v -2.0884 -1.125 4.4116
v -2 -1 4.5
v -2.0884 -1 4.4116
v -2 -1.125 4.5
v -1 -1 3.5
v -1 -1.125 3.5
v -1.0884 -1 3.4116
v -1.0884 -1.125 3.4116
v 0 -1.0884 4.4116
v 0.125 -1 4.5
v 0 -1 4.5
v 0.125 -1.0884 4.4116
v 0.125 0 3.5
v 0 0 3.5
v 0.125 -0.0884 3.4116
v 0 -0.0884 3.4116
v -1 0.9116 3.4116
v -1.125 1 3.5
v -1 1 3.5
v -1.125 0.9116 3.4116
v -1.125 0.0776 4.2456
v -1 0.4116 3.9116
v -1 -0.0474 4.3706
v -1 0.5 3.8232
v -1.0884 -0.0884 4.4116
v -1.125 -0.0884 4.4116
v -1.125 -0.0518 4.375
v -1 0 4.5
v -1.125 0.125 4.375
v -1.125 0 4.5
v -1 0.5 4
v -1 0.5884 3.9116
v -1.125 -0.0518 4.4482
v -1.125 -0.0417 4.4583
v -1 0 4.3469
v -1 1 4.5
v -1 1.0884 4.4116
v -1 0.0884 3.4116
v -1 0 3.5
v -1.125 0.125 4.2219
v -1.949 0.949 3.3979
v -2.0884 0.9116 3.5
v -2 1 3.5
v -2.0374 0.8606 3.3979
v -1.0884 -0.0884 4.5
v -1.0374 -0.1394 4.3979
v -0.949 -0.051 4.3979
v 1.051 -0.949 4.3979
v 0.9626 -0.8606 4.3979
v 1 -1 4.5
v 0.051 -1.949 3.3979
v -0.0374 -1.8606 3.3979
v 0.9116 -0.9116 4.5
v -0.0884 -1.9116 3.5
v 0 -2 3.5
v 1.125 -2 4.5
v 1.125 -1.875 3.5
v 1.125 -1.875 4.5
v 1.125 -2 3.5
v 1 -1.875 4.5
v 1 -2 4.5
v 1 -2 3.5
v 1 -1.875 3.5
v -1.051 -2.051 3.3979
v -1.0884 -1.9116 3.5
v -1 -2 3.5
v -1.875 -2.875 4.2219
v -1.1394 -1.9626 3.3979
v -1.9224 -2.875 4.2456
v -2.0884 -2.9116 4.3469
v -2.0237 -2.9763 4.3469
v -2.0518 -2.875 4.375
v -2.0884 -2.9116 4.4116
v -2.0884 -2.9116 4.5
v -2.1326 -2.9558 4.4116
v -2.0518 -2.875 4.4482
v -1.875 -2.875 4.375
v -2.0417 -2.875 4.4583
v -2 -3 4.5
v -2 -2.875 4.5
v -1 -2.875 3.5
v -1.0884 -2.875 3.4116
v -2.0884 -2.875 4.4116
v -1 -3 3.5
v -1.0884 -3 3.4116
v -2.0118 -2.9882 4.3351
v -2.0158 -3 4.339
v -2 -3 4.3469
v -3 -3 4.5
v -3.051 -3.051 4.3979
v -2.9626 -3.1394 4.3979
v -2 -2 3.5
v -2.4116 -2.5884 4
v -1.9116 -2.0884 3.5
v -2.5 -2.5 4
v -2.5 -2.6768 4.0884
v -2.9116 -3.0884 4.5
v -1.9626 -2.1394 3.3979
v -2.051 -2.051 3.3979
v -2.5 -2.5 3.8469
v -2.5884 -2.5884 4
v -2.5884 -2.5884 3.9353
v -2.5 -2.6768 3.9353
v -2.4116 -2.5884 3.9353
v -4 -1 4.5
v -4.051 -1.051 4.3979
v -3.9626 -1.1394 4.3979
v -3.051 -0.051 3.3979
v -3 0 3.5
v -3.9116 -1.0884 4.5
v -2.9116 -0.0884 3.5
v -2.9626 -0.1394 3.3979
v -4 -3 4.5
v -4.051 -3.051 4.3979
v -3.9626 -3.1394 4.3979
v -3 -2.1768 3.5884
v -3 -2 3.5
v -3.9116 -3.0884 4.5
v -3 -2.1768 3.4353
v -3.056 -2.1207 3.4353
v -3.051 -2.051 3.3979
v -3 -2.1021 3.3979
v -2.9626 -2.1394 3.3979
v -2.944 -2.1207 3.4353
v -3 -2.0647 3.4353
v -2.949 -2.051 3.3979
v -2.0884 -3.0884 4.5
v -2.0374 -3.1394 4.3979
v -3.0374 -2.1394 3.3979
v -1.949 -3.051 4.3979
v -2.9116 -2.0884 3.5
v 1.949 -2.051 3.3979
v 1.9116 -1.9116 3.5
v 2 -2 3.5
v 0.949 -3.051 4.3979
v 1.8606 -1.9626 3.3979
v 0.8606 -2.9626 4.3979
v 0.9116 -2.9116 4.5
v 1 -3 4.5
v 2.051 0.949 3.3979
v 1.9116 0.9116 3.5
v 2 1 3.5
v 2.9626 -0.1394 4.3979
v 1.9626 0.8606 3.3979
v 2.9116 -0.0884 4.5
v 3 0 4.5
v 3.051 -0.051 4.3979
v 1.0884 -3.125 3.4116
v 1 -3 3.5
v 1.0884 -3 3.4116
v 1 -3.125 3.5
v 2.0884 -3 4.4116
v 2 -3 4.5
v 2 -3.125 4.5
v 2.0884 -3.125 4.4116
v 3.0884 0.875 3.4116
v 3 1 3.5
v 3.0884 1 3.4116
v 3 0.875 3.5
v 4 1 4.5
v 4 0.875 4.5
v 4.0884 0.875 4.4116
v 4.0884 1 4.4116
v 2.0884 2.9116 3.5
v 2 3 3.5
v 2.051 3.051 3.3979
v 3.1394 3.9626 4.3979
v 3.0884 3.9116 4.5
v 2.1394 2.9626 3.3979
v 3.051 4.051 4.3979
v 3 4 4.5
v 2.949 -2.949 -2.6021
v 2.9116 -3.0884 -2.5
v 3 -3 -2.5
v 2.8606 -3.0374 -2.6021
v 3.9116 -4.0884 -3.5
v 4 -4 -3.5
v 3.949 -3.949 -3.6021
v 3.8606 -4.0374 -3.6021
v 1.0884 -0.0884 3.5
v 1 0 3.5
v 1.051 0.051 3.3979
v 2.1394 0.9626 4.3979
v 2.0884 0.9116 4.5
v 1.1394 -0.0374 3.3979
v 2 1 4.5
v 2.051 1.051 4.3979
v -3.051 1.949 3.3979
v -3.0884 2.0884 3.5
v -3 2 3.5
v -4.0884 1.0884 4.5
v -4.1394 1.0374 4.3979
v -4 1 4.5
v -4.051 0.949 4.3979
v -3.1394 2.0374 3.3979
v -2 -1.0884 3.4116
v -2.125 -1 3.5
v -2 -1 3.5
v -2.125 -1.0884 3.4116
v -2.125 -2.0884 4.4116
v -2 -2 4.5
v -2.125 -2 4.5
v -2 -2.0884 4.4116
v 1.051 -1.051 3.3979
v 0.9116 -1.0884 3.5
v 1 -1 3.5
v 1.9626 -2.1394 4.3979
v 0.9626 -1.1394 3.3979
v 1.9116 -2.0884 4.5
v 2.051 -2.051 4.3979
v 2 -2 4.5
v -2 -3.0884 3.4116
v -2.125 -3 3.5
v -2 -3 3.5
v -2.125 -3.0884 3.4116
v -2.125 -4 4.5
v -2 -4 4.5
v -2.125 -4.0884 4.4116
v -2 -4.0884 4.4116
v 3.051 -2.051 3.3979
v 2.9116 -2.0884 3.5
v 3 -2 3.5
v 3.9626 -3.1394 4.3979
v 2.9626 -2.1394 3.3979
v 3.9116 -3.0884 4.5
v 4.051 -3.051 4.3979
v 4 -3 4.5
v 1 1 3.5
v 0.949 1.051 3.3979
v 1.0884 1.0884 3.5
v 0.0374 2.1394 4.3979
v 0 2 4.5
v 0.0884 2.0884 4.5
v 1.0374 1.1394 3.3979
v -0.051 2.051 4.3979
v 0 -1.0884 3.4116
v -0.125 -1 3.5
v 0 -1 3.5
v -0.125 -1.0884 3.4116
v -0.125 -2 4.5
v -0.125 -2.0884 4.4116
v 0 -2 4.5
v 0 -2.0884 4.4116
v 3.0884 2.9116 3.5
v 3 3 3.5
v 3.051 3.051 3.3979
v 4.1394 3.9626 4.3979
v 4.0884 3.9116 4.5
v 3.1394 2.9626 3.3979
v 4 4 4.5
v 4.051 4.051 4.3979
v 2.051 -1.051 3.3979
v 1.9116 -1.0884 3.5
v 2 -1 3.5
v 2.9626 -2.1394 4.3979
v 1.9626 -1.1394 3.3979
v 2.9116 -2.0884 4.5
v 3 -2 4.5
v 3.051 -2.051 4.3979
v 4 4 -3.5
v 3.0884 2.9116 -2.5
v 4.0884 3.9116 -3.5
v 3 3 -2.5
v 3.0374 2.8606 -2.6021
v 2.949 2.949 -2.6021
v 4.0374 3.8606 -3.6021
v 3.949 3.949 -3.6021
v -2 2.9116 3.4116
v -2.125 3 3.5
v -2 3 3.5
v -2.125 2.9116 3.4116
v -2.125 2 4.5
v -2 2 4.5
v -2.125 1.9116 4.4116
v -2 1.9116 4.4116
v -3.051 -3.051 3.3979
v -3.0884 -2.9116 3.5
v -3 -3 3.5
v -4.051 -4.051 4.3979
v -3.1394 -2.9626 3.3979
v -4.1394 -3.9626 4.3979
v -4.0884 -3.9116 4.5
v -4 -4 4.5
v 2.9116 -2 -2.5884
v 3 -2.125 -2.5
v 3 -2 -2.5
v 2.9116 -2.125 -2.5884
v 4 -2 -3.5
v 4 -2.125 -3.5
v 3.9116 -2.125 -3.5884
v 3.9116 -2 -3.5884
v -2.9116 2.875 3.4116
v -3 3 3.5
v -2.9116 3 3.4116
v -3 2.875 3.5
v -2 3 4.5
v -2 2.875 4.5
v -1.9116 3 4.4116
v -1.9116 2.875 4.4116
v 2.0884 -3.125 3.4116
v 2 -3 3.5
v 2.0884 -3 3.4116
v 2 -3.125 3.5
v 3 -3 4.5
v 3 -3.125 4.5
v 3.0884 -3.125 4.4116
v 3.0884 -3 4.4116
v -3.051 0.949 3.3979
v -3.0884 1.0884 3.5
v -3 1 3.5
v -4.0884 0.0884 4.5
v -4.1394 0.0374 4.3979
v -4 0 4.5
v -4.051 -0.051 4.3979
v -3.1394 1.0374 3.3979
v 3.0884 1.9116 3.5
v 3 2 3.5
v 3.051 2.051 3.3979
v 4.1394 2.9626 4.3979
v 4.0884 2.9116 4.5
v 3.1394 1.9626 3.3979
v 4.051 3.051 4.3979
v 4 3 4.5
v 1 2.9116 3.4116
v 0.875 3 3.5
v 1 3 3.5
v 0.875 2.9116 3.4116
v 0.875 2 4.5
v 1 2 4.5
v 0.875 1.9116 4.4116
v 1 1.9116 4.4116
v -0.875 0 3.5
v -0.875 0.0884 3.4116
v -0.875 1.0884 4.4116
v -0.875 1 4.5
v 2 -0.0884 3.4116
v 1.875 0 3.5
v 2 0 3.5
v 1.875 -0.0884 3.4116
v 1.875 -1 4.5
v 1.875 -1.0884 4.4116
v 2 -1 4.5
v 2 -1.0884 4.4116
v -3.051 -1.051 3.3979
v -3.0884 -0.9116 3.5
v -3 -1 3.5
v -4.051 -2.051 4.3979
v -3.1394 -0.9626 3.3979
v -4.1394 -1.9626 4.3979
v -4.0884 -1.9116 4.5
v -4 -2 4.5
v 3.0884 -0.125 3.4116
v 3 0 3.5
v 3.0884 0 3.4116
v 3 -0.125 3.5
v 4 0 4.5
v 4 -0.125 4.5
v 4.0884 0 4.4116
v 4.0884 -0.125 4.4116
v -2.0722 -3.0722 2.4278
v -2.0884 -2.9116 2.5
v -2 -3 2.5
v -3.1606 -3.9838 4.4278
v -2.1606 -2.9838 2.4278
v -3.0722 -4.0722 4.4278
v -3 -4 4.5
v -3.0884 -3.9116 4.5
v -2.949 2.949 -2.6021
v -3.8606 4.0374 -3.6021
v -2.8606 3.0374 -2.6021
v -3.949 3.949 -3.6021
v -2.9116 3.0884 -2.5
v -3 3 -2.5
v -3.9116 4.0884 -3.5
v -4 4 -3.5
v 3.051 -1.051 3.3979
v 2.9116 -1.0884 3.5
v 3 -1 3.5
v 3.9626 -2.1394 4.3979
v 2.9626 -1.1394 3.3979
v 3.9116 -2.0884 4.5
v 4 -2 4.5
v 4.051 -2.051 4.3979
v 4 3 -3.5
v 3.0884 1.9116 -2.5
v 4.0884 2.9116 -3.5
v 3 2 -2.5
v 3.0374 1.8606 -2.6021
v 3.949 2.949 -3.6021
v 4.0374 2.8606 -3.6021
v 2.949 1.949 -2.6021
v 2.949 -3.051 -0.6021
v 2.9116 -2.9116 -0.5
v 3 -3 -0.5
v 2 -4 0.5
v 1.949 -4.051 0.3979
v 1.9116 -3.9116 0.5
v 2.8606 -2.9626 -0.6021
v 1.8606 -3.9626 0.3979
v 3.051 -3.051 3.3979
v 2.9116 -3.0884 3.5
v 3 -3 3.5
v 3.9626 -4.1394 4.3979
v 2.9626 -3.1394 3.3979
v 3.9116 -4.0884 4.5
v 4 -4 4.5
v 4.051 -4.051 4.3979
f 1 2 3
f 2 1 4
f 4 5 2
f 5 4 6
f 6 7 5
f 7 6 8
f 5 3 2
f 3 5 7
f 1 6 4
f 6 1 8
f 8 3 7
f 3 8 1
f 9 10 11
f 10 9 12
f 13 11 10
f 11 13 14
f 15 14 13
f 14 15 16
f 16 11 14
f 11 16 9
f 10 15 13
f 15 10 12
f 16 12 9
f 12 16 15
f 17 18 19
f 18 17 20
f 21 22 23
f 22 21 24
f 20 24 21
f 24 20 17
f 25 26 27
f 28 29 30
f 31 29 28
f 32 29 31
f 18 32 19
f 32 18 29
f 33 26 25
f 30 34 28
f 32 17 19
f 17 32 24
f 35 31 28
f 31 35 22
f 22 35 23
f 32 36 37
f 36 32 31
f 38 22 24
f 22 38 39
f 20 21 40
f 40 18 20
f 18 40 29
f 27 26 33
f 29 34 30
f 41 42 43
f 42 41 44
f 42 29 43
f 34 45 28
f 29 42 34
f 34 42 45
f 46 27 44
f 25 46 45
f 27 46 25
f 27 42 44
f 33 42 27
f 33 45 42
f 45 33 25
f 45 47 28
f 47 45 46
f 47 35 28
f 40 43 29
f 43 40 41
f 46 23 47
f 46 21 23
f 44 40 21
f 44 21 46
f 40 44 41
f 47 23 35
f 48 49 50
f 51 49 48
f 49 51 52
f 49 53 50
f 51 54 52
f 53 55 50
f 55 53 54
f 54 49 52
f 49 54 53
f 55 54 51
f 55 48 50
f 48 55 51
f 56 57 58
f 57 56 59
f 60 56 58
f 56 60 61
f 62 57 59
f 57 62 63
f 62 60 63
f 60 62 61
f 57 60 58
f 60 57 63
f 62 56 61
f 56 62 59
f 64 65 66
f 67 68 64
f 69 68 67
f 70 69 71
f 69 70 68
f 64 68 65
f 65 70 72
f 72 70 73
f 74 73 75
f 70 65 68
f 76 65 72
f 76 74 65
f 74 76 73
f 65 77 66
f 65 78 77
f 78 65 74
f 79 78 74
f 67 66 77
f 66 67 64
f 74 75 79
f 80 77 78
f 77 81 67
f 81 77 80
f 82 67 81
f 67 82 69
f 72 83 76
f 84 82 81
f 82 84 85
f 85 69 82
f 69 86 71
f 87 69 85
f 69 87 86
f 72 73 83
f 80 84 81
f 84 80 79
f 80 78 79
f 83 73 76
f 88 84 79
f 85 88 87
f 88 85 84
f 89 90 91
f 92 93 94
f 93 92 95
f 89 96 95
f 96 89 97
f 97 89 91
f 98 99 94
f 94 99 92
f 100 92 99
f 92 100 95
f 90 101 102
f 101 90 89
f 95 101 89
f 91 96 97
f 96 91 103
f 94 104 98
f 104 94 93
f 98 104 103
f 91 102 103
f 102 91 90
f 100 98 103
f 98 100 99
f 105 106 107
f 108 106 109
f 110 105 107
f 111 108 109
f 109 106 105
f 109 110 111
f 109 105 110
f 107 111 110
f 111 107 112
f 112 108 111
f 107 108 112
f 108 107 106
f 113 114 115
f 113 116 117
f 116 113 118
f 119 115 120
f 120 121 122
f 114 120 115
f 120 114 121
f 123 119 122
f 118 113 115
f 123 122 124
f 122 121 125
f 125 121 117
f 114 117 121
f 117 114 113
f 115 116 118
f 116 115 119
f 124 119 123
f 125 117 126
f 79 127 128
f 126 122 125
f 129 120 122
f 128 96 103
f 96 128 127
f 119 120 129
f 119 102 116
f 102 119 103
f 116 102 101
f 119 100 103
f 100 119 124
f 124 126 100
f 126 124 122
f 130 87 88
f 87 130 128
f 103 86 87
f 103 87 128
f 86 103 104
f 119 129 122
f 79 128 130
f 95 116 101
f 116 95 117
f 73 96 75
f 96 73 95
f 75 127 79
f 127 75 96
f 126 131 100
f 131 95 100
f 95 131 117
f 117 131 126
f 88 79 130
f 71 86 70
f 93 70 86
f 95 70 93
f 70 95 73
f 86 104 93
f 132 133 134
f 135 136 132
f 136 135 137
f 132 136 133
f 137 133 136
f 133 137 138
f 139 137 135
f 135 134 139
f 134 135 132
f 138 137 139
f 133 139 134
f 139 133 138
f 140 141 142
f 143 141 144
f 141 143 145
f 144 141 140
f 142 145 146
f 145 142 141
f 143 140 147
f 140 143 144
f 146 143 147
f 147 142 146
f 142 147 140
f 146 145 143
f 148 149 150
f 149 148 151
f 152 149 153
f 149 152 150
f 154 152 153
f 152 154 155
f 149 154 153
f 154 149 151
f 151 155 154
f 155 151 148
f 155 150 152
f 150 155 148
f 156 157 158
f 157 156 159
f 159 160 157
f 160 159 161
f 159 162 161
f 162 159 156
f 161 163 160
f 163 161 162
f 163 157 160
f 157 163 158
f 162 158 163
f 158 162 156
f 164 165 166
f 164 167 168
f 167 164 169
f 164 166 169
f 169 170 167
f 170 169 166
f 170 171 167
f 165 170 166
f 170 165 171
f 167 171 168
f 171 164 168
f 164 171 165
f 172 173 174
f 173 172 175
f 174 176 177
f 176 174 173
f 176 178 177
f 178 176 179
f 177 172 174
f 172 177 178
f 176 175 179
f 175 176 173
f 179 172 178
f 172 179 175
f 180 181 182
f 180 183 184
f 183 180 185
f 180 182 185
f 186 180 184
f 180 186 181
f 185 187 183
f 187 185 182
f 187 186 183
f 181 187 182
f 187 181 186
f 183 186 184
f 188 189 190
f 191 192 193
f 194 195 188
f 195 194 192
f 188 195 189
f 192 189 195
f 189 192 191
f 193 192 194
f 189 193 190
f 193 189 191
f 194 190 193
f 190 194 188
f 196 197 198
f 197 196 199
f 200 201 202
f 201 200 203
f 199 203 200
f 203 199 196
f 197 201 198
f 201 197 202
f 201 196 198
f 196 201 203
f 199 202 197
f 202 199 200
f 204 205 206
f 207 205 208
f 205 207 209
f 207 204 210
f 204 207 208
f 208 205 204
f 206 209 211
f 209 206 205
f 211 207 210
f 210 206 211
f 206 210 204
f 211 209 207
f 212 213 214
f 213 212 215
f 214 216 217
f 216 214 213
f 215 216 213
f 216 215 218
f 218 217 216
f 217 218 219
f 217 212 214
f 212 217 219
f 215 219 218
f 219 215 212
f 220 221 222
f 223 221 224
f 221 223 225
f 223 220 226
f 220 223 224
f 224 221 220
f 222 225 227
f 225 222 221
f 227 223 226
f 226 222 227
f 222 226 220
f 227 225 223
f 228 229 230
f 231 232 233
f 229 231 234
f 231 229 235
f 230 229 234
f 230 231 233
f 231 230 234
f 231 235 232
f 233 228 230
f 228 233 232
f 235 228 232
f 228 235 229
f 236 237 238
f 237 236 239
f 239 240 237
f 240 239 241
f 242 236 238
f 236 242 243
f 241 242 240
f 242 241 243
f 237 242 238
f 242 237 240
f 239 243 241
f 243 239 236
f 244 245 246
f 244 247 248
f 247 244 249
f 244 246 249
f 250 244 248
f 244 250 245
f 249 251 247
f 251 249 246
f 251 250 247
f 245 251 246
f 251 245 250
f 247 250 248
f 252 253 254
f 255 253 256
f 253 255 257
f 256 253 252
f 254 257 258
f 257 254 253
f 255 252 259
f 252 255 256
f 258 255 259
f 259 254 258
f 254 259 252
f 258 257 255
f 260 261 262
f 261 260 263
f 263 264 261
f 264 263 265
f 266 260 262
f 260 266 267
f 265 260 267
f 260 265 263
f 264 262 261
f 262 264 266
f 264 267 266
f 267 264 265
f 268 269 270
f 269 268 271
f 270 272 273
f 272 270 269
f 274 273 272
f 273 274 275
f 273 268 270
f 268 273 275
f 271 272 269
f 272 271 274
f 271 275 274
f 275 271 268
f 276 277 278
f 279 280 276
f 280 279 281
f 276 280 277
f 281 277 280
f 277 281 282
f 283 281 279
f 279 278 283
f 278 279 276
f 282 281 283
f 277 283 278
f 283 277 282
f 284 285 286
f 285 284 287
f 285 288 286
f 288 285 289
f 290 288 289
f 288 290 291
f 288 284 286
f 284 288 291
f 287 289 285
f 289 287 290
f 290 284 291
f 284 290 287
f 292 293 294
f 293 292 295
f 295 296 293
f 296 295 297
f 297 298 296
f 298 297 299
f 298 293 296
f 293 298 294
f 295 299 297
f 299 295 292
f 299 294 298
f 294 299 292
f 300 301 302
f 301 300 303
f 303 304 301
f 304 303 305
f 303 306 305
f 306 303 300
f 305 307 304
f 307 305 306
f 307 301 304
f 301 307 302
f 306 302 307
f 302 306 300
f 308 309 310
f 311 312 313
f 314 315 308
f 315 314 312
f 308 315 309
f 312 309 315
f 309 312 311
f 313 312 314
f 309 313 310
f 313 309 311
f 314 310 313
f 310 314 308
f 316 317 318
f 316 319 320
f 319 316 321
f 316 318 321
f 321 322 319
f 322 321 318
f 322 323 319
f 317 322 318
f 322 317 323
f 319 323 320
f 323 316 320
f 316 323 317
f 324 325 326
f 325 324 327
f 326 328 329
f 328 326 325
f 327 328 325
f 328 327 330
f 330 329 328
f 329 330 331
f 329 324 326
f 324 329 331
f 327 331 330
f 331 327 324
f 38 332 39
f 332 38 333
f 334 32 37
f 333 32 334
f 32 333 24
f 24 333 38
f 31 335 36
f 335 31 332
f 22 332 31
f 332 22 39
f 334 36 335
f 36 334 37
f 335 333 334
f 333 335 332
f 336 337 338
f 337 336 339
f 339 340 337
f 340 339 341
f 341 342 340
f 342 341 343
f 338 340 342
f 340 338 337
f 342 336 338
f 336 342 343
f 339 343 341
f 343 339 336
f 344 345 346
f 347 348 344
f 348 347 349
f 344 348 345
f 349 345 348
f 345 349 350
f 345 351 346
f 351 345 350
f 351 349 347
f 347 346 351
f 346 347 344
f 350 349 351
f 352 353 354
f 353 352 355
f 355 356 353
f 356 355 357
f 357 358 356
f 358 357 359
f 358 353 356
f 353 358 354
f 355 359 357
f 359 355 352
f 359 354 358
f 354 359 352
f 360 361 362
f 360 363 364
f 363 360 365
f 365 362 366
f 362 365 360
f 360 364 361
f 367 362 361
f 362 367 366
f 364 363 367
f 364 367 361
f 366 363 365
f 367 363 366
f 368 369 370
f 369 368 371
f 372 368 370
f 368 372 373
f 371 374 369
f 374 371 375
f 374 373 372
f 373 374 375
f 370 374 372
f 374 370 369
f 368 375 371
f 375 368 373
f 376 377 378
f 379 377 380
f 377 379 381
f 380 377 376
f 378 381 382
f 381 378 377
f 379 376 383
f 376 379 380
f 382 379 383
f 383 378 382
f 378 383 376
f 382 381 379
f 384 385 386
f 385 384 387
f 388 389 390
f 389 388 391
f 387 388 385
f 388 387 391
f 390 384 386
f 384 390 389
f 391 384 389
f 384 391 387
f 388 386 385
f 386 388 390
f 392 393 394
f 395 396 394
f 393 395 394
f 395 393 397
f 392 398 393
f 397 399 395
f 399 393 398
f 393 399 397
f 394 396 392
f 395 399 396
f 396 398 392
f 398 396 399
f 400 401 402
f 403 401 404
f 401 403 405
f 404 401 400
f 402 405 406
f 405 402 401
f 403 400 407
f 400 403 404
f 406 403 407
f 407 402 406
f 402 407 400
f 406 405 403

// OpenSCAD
translate(v = [-0.5, -0.5, 0]) {
	/*Shell 0*/
	union() {
		%/*Nodes shell 0*/
		union();
		/*Edges shell 0*/
		union();
	}
	/*Shell 1*/
	union() {
		%/*Nodes shell 1*/
		union();
		/*Edges shell 1*/
		union();
	}
	/*Shell 2*/
	union() {
		%/*Nodes shell 2*/
		union() {
			/*Node $_45*/
			color(alpha = 0.1, c = "yellow") {
				translate(v = [-1, -1, 3]) {
					cube(size = [1, 1, 1]);
				}
			}
			/*Node $_23*/
			color(alpha = 0.1, c = "orange") {
				translate(v = [0, 0, 3]) {
					cube(size = [1, 1, 1]);
				}
			}
			/*Node $_94*/
			color(alpha = 0.1, c = "yellow") {
				translate(v = [-1, 1, 3]) {
					cube(size = [1, 1, 1]);
				}
			}
			/*Node $_95*/
			color(alpha = 0.1, c = "orange") {
				translate(v = [-2, 1, 3]) {
					cube(size = [1, 1, 1]);
				}
			}
			/*Node $_49*/
			color(alpha = 0.1, c = "yellow") {
				translate(v = [0, -2, 3]) {
					cube(size = [1, 1, 1]);
				}
			}
			/*Node $_27*/
			color(alpha = 0.1, c = "orange") {
				translate(v = [1, -2, 3]) {
					cube(size = [1, 1, 1]);
				}
			}
			/*Node $_100*/
			color(alpha = 0.1, c = "yellow") {
				translate(v = [-1, -2, 3]) {
					cube(size = [1, 1, 1]);
				}
			}
			/*Node $_101*/
			color(alpha = 0.1, c = "orange") {
				translate(v = [-1, -3, 3]) {
					cube(size = [1, 1, 1]);
				}
			}
			/*Node $_52*/
			color(alpha = 0.1, c = "yellow") {
				translate(v = [-2, -2, 3]) {
					cube(size = [1, 1, 1]);
				}
			}
			/*Node $_30*/
			color(alpha = 0.1, c = "orange") {
				translate(v = [-3, 0, 3]) {
					cube(size = [1, 1, 1]);
				}
			}
			/*Node $_110*/
			color(alpha = 0.1, c = "pink") {
				translate(v = [-3, -2, 3]) {
					cube(size = [1, 1, 1]);
				}
			}
			/*Node $_18__2*/
			color(alpha = 0.1, c = "lightblue") {
				translate(v = [2, -2, 3]) {
					cube(size = [1, 1, 1]);
				}
			}
			/*Node $_28__2*/
			color(alpha = 0.1, c = "lightblue") {
				translate(v = [2, 1, 3]) {
					cube(size = [1, 1, 1]);
				}
			}
			/*Node $_19__2*/
			color(alpha = 0.1, c = "lightblue") {
				translate(v = [1, -3, 3]) {
					cube(size = [1, 1, 1]);
				}
			}
			/*Node $_33__2*/
			color(alpha = 0.1, c = "lightblue") {
				translate(v = [3, 1, 3]) {
					cube(size = [1, 1, 1]);
				}
			}
			/*Node $_12__2*/
			color(alpha = 0.1, c = "lightblue") {
				translate(v = [2, 3, 3]) {
					cube(size = [1, 1, 1]);
				}
			}
			/*Node $_39__2*/
			color(alpha = 0.1, c = "lightblue") {
				translate(v = [3, -3, -3]) {
					cube(size = [1, 1, 1]);
				}
			}
			/*Node $_15__2*/
			color(alpha = 0.1, c = "lightblue") {
				translate(v = [1, 0, 3]) {
					cube(size = [1, 1, 1]);
				}
			}
			/*Node $_40__2*/
			color(alpha = 0.1, c = "lightblue") {
				translate(v = [-3, 2, 3]) {
					cube(size = [1, 1, 1]);
				}
			}
			/*Node $_36__2*/
			color(alpha = 0.1, c = "lightblue") {
				translate(v = [-2, -1, 3]) {
					cube(size = [1, 1, 1]);
				}
			}
			/*Node $_47__2*/
			color(alpha = 0.1, c = "lightblue") {
				translate(v = [1, -1, 3]) {
					cube(size = [1, 1, 1]);
				}
			}
			/*Node $_35__2*/
			color(alpha = 0.1, c = "lightblue") {
				translate(v = [-2, -3, 3]) {
					cube(size = [1, 1, 1]);
				}
			}
			/*Node $_20__2*/
			color(alpha = 0.1, c = "lightblue") {
				translate(v = [3, -2, 3]) {
					cube(size = [1, 1, 1]);
				}
			}
			/*Node $_34__2*/
			color(alpha = 0.1, c = "lightblue") {
				translate(v = [1, 1, 3]) {
					cube(size = [1, 1, 1]);
				}
			}
			/*Node $_108__2*/
			color(alpha = 0.1, c = "lightblue") {
				translate(v = [0, -1, 3]) {
					cube(size = [1, 1, 1]);
				}
			}
			/*Node $_44__2*/
			color(alpha = 0.1, c = "lightblue") {
				translate(v = [3, 3, 3]) {
					cube(size = [1, 1, 1]);
				}
			}
			/*Node $_50__2*/
			color(alpha = 0.1, c = "lightblue") {
				translate(v = [2, -1, 3]) {
					cube(size = [1, 1, 1]);
				}
			}
			/*Node $_11__2*/
			color(alpha = 0.1, c = "lightblue") {
				translate(v = [3, 3, -3]) {
					cube(size = [1, 1, 1]);
				}
			}
			/*Node $_14__2*/
			color(alpha = 0.1, c = "lightblue") {
				translate(v = [-2, 3, 3]) {
					cube(size = [1, 1, 1]);
				}
			}
			/*Node $_41__2*/
			color(alpha = 0.1, c = "lightblue") {
				translate(v = [-3, -3, 3]) {
					cube(size = [1, 1, 1]);
				}
			}
			/*Node $_42__2*/
			color(alpha = 0.1, c = "lightblue") {
				translate(v = [3, -2, -3]) {
					cube(size = [1, 1, 1]);
				}
			}
			/*Node $_10__2*/
			color(alpha = 0.1, c = "lightblue") {
				translate(v = [-3, 3, 3]) {
					cube(size = [1, 1, 1]);
				}
			}
			/*Node $_17__2*/
			color(alpha = 0.1, c = "lightblue") {
				translate(v = [2, -3, 3]) {
					cube(size = [1, 1, 1]);
				}
			}
			/*Node $_24__2*/
			color(alpha = 0.1, c = "lightblue") {
				translate(v = [-3, 1, 3]) {
					cube(size = [1, 1, 1]);
				}
			}
			/*Node $_21__2*/
			color(alpha = 0.1, c = "lightblue") {
				translate(v = [3, 2, 3]) {
					cube(size = [1, 1, 1]);
				}
			}
			/*Node $_38__2*/
			color(alpha = 0.1, c = "lightblue") {
				translate(v = [1, 3, 3]) {
					cube(size = [1, 1, 1]);
				}
			}
			/*Node $_37__2*/
			color(alpha = 0.1, c = "lightblue") {
				translate(v = [-1, 0, 3]) {
					cube(size = [1, 1, 1]);
				}
			}
			/*Node $_25__2*/
			color(alpha = 0.1, c = "lightblue") {
				translate(v = [2, 0, 3]) {
					cube(size = [1, 1, 1]);
				}
			}
			/*Node $_46__2*/
			color(alpha = 0.1, c = "lightblue") {
				translate(v = [-3, -1, 3]) {
					cube(size = [1, 1, 1]);
				}
			}
			/*Node $_43__2*/
			color(alpha = 0.1, c = "lightblue") {
				translate(v = [3, 0, 3]) {
					cube(size = [1, 1, 1]);
				}
			}
			/*Node $_32__2*/
			color(alpha = 0.1, c = "lightblue") {
				translate(v = [-2, -3, 2]) {
					cube(size = [1, 1, 1]);
				}
			}
			/*Node $_9__2*/
			color(alpha = 0.1, c = "lightblue") {
				translate(v = [-3, 3, -3]) {
					cube(size = [1, 1, 1]);
				}
			}
			/*Node $_22__2*/
			color(alpha = 0.1, c = "lightblue") {
				translate(v = [3, -1, 3]) {
					cube(size = [1, 1, 1]);
				}
			}
			/*Node $_31__2*/
			color(alpha = 0.1, c = "lightblue") {
				translate(v = [3, 2, -3]) {
					cube(size = [1, 1, 1]);
				}
			}
			/*Node $_16__2*/
			color(alpha = 0.1, c = "lightblue") {
				translate(v = [3, -3, -1]) {
					cube(size = [1, 1, 1]);
				}
			}
			/*Node $_13__2*/
			color(alpha = 0.1, c = "lightblue") {
				translate(v = [3, -3, 3]) {
					cube(size = [1, 1, 1]);
				}
			}
		}
		/*Edges shell 2*/
		union() {
			/*Edge 45 from one.ctrl_s[1].flush to $_45*/
			translate(v = [-0.5, -0.5, 3.5]) {
				rotate(a = [0, 45.00000000000001, 180.0]) {
					cube(size = [0.125, 0.125, 1.4142135623730951]);
				}
			}
			/*Edge 23 from one.ctrl_s[1].hole to $_23*/
			translate(v = [0.5, 0.5, 3.5]) {
				rotate(a = [0, 45.00000000000001, -90.0]) {
					cube(size = [0.125, 0.125, 1.4142135623730951]);
				}
			}
			/*Edge 94 from $_94 to one.thingy.devices[0].thingy.vp0*/
			translate(v = [-0.5, 0.5, 4.5]) {
				rotate(a = [0, 135.0, 90.0]) {
					cube(size = [0.125, 0.125, 1.4142135623730951]);
				}
			}
			/*Edge 95 from $_95 to one.thingy.devices[0].thingy.vp0*/
			translate(v = [-0.5, 0.5, 4.5]) {
				rotate(a = [0, 125.26438968275465, 135.0]) {
					cube(size = [0.125, 0.125, 1.7320508075688772]);
				}
			}
			/*Edge 49 from one.pump_a[1].flush to $_49*/
			translate(v = [0.5, -1.5, 3.5]) {
				rotate(a = [0, 54.735610317245346, 45.0]) {
					cube(size = [0.125, 0.125, 1.7320508075688772]);
				}
			}
			/*Edge 27 from one.pump_a[1].hole to $_27*/
			translate(v = [1.5, -1.5, 3.5]) {
				rotate(a = [0, 0.0, 0.0]) {
					cube(size = [0.125, 0.125, 1.0]);
				}
			}
			/*Edge 100 from $_100 to one.thingy.devices[0].thingy.vp3*/
			translate(v = [-1.5, -2.5, 4.5]) {
				rotate(a = [0, 125.26438968275465, 45.0]) {
					cube(size = [0.125, 0.125, 1.7320508075688772]);
				}
			}
			/*Edge 101 from $_101 to one.thingy.devices[0].thingy.vp3*/
			translate(v = [-1.5, -2.5, 4.5]) {
				rotate(a = [0, 135.0, 0.0]) {
					cube(size = [0.125, 0.125, 1.4142135623730951]);
				}
			}
			/*Edge 52 from one.pump_b[1].flush to $_52*/
			translate(v = [-1.5, -1.5, 3.5]) {
				rotate(a = [0, 54.735610317245346, -135.0]) {
					cube(size = [0.125, 0.125, 1.7320508075688772]);
				}
			}
			/*Edge 30 from one.pump_b[1].hole to $_30*/
			translate(v = [-2.5, 0.5, 3.5]) {
				rotate(a = [0, 54.735610317245346, -135.0]) {
					cube(size = [0.125, 0.125, 1.7320508075688772]);
				}
			}
			/*Edge 110 from one.thingy.devices[0].thingy.column_upper to $_110*/
			translate(v = [-2.5, -1.5, 3.5]) {
				rotate(a = [0, 54.735610317245346, -135.0]) {
					cube(size = [0.125, 0.125, 1.7320508075688772]);
				}
			}
			/*Edge 110 from $_110 to one.thingy.devices[0].thingy.vp3*/
			translate(v = [-1.5, -2.5, 4.5]) {
				rotate(a = [0, 125.26438968275465, 135.0]) {
					cube(size = [0.125, 0.125, 1.7320508075688772]);
				}
			}
			/*Edge -1 from $_18__2 to $_18__3*/
			translate(v = [1.5, -2.5, 4.5]) {
				rotate(a = [0, 125.26438968275465, 45.0]) {
					cube(size = [0.125, 0.125, 1.7320508075688772]);
				}
			}
			/*Edge -1 from $_28__2 to $_28__3*/
			translate(v = [3.5, 0.5, 4.5]) {
				rotate(a = [0, 125.26438968275465, 135.0]) {
					cube(size = [0.125, 0.125, 1.7320508075688772]);
				}
			}
			/*Edge -1 from $_19__2 to $_19__3*/
			translate(v = [2.5, -2.5, 4.5]) {
				rotate(a = [0, 135.0, 180.0]) {
					cube(size = [0.125, 0.125, 1.4142135623730951]);
				}
			}
			/*Edge -1 from $_33__2 to $_33__3*/
			translate(v = [4.5, 1.5, 4.5]) {
				rotate(a = [0, 135.0, 180.0]) {
					cube(size = [0.125, 0.125, 1.4142135623730951]);
				}
			}
			/*Edge -1 from $_12__2 to $_12__3*/
			translate(v = [3.5, 4.5, 4.5]) {
				rotate(a = [0, 125.26438968275465, -135.0]) {
					cube(size = [0.125, 0.125, 1.7320508075688772]);
				}
			}
			/*Edge -1 from $_39__2 to $_39__3*/
			translate(v = [4.5, -3.5, -3.5]) {
				rotate(a = [0, 54.735610317245346, 135.0]) {
					cube(size = [0.125, 0.125, 1.7320508075688772]);
				}
			}
			/*Edge -1 from $_15__2 to $_15__3*/
			translate(v = [2.5, 1.5, 4.5]) {
				rotate(a = [0, 125.26438968275465, -135.0]) {
					cube(size = [0.125, 0.125, 1.7320508075688772]);
				}
			}
			/*Edge -1 from $_40__2 to $_40__3*/
			translate(v = [-3.5, 1.5, 4.5]) {
				rotate(a = [0, 125.26438968275465, 45.0]) {
					cube(size = [0.125, 0.125, 1.7320508075688772]);
				}
			}
			/*Edge -1 from $_36__2 to $_36__3*/
			translate(v = [-1.5, -1.5, 4.5]) {
				rotate(a = [0, 135.0, 90.0]) {
					cube(size = [0.125, 0.125, 1.4142135623730951]);
				}
			}
			/*Edge -1 from $_47__2 to $_47__3*/
			translate(v = [2.5, -1.5, 4.5]) {
				rotate(a = [0, 125.26438968275465, 135.0]) {
					cube(size = [0.125, 0.125, 1.7320508075688772]);
				}
			}
			/*Edge -1 from $_35__2 to $_35__3*/
			translate(v = [-1.5, -3.5, 4.5]) {
				rotate(a = [0, 135.0, 90.0]) {
					cube(size = [0.125, 0.125, 1.4142135623730951]);
				}
			}
			/*Edge -1 from $_20__2 to $_20__3*/
			translate(v = [4.5, -2.5, 4.5]) {
				rotate(a = [0, 125.26438968275465, 135.0]) {
					cube(size = [0.125, 0.125, 1.7320508075688772]);
				}
			}
			/*Edge -1 from $_34__2 to $_34__3*/
			translate(v = [0.5, 2.5, 4.5]) {
				rotate(a = [0, 125.26438968275465, -45.0]) {
					cube(size = [0.125, 0.125, 1.7320508075688772]);
				}
			}
			/*Edge -1 from $_108__2 to $_108__3*/
			translate(v = [0.5, -1.5, 4.5]) {
				rotate(a = [0, 135.0, 90.0]) {
					cube(size = [0.125, 0.125, 1.4142135623730951]);
				}
			}
			/*Edge -1 from $_44__2 to $_44__3*/
			translate(v = [4.5, 4.5, 4.5]) {
				rotate(a = [0, 125.26438968275465, -135.0]) {
					cube(size = [0.125, 0.125, 1.7320508075688772]);
				}
			}
			/*Edge -1 from $_50__2 to $_50__3*/
			translate(v = [3.5, -1.5, 4.5]) {
				rotate(a = [0, 125.26438968275465, 135.0]) {
					cube(size = [0.125, 0.125, 1.7320508075688772]);
				}
			}
			/*Edge -1 from $_11__2 to $_11__3*/
			translate(v = [4.5, 4.5, -3.5]) {
				rotate(a = [0, 54.735610317245346, -135.0]) {
					cube(size = [0.125, 0.125, 1.7320508075688772]);
				}
			}
			/*Edge -1 from $_14__2 to $_14__3*/
			translate(v = [-1.5, 2.5, 4.5]) {
				rotate(a = [0, 135.0, 90.0]) {
					cube(size = [0.125, 0.125, 1.4142135623730951]);
				}
			}
			/*Edge -1 from $_41__2 to $_41__3*/
			translate(v = [-3.5, -3.5, 4.5]) {
				rotate(a = [0, 125.26438968275465, 45.0]) {
					cube(size = [0.125, 0.125, 1.7320508075688772]);
				}
			}
			/*Edge -1 from $_42__2 to $_42__3*/
			translate(v = [4.5, -1.5, -3.5]) {
				rotate(a = [0, 45.00000000000001, 180.0]) {
					cube(size = [0.125, 0.125, 1.4142135623730951]);
				}
			}
			/*Edge -1 from $_10__2 to $_10__3*/
			translate(v = [-1.5, 3.5, 4.5]) {
				rotate(a = [0, 135.0, 180.0]) {
					cube(size = [0.125, 0.125, 1.4142135623730951]);
				}
			}
			/*Edge -1 from $_17__2 to $_17__3*/
			translate(v = [3.5, -2.5, 4.5]) {
				rotate(a = [0, 135.0, 180.0]) {
					cube(size = [0.125, 0.125, 1.4142135623730951]);
				}
			}
			/*Edge -1 from $_24__2 to $_24__3*/
			translate(v = [-3.5, 0.5, 4.5]) {
				rotate(a = [0, 125.26438968275465, 45.0]) {
					cube(size = [0.125, 0.125, 1.7320508075688772]);
				}
			}
			/*Edge -1 from $_21__2 to $_21__3*/
			translate(v = [4.5, 3.5, 4.5]) {
				rotate(a = [0, 125.26438968275465, -135.0]) {
					cube(size = [0.125, 0.125, 1.7320508075688772]);
				}
			}
			/*Edge -1 from $_38__2 to $_38__3*/
			translate(v = [1.5, 2.5, 4.5]) {
				rotate(a = [0, 135.0, 90.0]) {
					cube(size = [0.125, 0.125, 1.4142135623730951]);
				}
			}
			/*Edge -1 from $_37__2 to $_37__3*/
			translate(v = [-0.5, 1.5, 4.5]) {
				rotate(a = [0, 135.0, -90.0]) {
					cube(size = [0.125, 0.125, 1.4142135623730951]);
				}
			}
			/*Edge -1 from $_25__2 to $_25__3*/
			translate(v = [2.5, -0.5, 4.5]) {
				rotate(a = [0, 135.0, 90.0]) {
					cube(size = [0.125, 0.125, 1.4142135623730951]);
				}
			}
			/*Edge -1 from $_46__2 to $_46__3*/
			translate(v = [-3.5, -1.5, 4.5]) {
				rotate(a = [0, 125.26438968275465, 45.0]) {
					cube(size = [0.125, 0.125, 1.7320508075688772]);
				}
			}
			/*Edge -1 from $_43__2 to $_43__3*/
			translate(v = [4.5, 0.5, 4.5]) {
				rotate(a = [0, 135.0, 180.0]) {
					cube(size = [0.125, 0.125, 1.4142135623730951]);
				}
			}
			/*Edge -1 from $_32__2 to $_32__3*/
			translate(v = [-2.5, -3.5, 4.5]) {
				rotate(a = [0, 144.73561031724537, 45.0]) {
					cube(size = [0.125, 0.125, 2.449489742783178]);
				}
			}
			/*Edge -1 from $_9__2 to $_9__3*/
			translate(v = [-3.5, 4.5, -3.5]) {
				rotate(a = [0, 54.735610317245346, -45.0]) {
					cube(size = [0.125, 0.125, 1.7320508075688772]);
				}
			}
			/*Edge -1 from $_22__2 to $_22__3*/
			translate(v = [4.5, -1.5, 4.5]) {
				rotate(a = [0, 125.26438968275465, 135.0]) {
					cube(size = [0.125, 0.125, 1.7320508075688772]);
				}
			}
			/*Edge -1 from $_31__2 to $_31__3*/
			translate(v = [4.5, 3.5, -3.5]) {
				rotate(a = [0, 54.735610317245346, -135.0]) {
					cube(size = [0.125, 0.125, 1.7320508075688772]);
				}
			}
			/*Edge -1 from $_16__2 to $_16__3*/
			translate(v = [2.5, -3.5, 0.5]) {
				rotate(a = [0, 125.26438968275465, 45.0]) {
					cube(size = [0.125, 0.125, 1.7320508075688772]);
				}
			}
			/*Edge -1 from $_13__2 to $_13__3*/
			translate(v = [4.5, -3.5, 4.5]) {
				rotate(a = [0, 125.26438968275465, 135.0]) {
					cube(size = [0.125, 0.125, 1.7320508075688772]);
				}
			}
		}
	}
	/*Shell 3*/
	union() {
		%/*Nodes shell 3*/
		union() {
			/*Node one.ctrl_s[1].flush*/
			color(alpha = 0.1, c = "lightgreen") {
				translate(v = [-2, -1, 4]) {
					cube(size = [1, 1, 1]);
				}
			}
			/*Node one.ctrl_s[1].hole*/
			color(alpha = 0.1, c = "green") {
				translate(v = [0, -1, 4]) {
					cube(size = [1, 1, 1]);
				}
			}
			/*Node one.pump_a[1].flush*/
			color(alpha = 0.1, c = "lightgreen") {
				translate(v = [1, -1, 4]) {
					cube(size = [1, 1, 1]);
				}
			}
			/*Node one.pump_a[1].hole*/
			color(alpha = 0.1, c = "green") {
				translate(v = [1, -2, 4]) {
					cube(size = [1, 1, 1]);
				}
			}
			/*Node one.pump_b[1].flush*/
			color(alpha = 0.1, c = "lightgreen") {
				translate(v = [-3, -3, 4]) {
					cube(size = [1, 1, 1]);
				}
			}
			/*Node one.pump_b[1].hole*/
			color(alpha = 0.1, c = "green") {
				translate(v = [-4, -1, 4]) {
					cube(size = [1, 1, 1]);
				}
			}
			/*Node one.thingy.devices[0].thingy.column_upper*/
			color(alpha = 0.1, c = "black") {
				translate(v = [-4, -3, 4]) {
					cube(size = [1, 1, 1]);
				}
			}
			/*Node one.thingy.devices[0].thingy.vp0*/
			color(alpha = 0.1, c = "black") {
				translate(v = [-1, 0, 4]) {
					cube(size = [1, 1, 1]);
				}
			}
			/*Node one.thingy.devices[0].thingy.vp3*/
			color(alpha = 0.1, c = "black") {
				translate(v = [-2, -3, 4]) {
					cube(size = [1, 1, 1]);
				}
			}
			/*Node $_18__3*/
			color(alpha = 0.1, c = "lightblue") {
				translate(v = [1, -3, 4]) {
					cube(size = [1, 1, 1]);
				}
			}
			/*Node $_28__3*/
			color(alpha = 0.1, c = "lightblue") {
				translate(v = [3, 0, 4]) {
					cube(size = [1, 1, 1]);
				}
			}
			/*Node $_19__3*/
			color(alpha = 0.1, c = "lightblue") {
				translate(v = [2, -3, 4]) {
					cube(size = [1, 1, 1]);
				}
			}
			/*Node $_33__3*/
			color(alpha = 0.1, c = "lightblue") {
				translate(v = [4, 1, 4]) {
					cube(size = [1, 1, 1]);
				}
			}
			/*Node $_12__3*/
			color(alpha = 0.1, c = "lightblue") {
				translate(v = [3, 4, 4]) {
					cube(size = [1, 1, 1]);
				}
			}
			/*Node $_39__3*/
			color(alpha = 0.1, c = "lightblue") {
				translate(v = [4, -4, -4]) {
					cube(size = [1, 1, 1]);
				}
			}
			/*Node $_15__3*/
			color(alpha = 0.1, c = "lightblue") {
				translate(v = [2, 1, 4]) {
					cube(size = [1, 1, 1]);
				}
			}
			/*Node $_40__3*/
			color(alpha = 0.1, c = "lightblue") {
				translate(v = [-4, 1, 4]) {
					cube(size = [1, 1, 1]);
				}
			}
			/*Node $_36__3*/
			color(alpha = 0.1, c = "lightblue") {
				translate(v = [-2, -2, 4]) {
					cube(size = [1, 1, 1]);
				}
			}
			/*Node $_47__3*/
			color(alpha = 0.1, c = "lightblue") {
				translate(v = [2, -2, 4]) {
					cube(size = [1, 1, 1]);
				}
			}
			/*Node $_35__3*/
			color(alpha = 0.1, c = "lightblue") {
				translate(v = [-2, -4, 4]) {
					cube(size = [1, 1, 1]);
				}
			}
			/*Node $_20__3*/
			color(alpha = 0.1, c = "lightblue") {
				translate(v = [4, -3, 4]) {
					cube(size = [1, 1, 1]);
				}
			}
			/*Node $_34__3*/
			color(alpha = 0.1, c = "lightblue") {
				translate(v = [0, 2, 4]) {
					cube(size = [1, 1, 1]);
				}
			}
			/*Node $_108__3*/
			color(alpha = 0.1, c = "lightblue") {
				translate(v = [0, -2, 4]) {
					cube(size = [1, 1, 1]);
				}
			}
			/*Node $_44__3*/
			color(alpha = 0.1, c = "lightblue") {
				translate(v = [4, 4, 4]) {
					cube(size = [1, 1, 1]);
				}
			}
			/*Node $_50__3*/
			color(alpha = 0.1, c = "lightblue") {
				translate(v = [3, -2, 4]) {
					cube(size = [1, 1, 1]);
				}
			}
			/*Node $_11__3*/
			color(alpha = 0.1, c = "lightblue") {
				translate(v = [4, 4, -4]) {
					cube(size = [1, 1, 1]);
				}
			}
			/*Node $_14__3*/
			color(alpha = 0.1, c = "lightblue") {
				translate(v = [-2, 2, 4]) {
					cube(size = [1, 1, 1]);
				}
			}
			/*Node $_41__3*/
			color(alpha = 0.1, c = "lightblue") {
				translate(v = [-4, -4, 4]) {
					cube(size = [1, 1, 1]);
				}
			}
			/*Node $_42__3*/
			color(alpha = 0.1, c = "lightblue") {
				translate(v = [4, -2, -4]) {
					cube(size = [1, 1, 1]);
				}
			}
			/*Node $_10__3*/
			color(alpha = 0.1, c = "lightblue") {
				translate(v = [-2, 3, 4]) {
					cube(size = [1, 1, 1]);
				}
			}
			/*Node $_17__3*/
			color(alpha = 0.1, c = "lightblue") {
				translate(v = [3, -3, 4]) {
					cube(size = [1, 1, 1]);
				}
			}
			/*Node $_24__3*/
			color(alpha = 0.1, c = "lightblue") {
				translate(v = [-4, 0, 4]) {
					cube(size = [1, 1, 1]);
				}
			}
			/*Node $_21__3*/
			color(alpha = 0.1, c = "lightblue") {
				translate(v = [4, 3, 4]) {
					cube(size = [1, 1, 1]);
				}
			}
			/*Node $_38__3*/
			color(alpha = 0.1, c = "lightblue") {
				translate(v = [1, 2, 4]) {
					cube(size = [1, 1, 1]);
				}
			}
			/*Node $_37__3*/
			color(alpha = 0.1, c = "lightblue") {
				translate(v = [-1, 1, 4]) {
					cube(size = [1, 1, 1]);
				}
			}
			/*Node $_25__3*/
			color(alpha = 0.1, c = "lightblue") {
				translate(v = [2, -1, 4]) {
					cube(size = [1, 1, 1]);
				}
			}
			/*Node $_46__3*/
			color(alpha = 0.1, c = "lightblue") {
				translate(v = [-4, -2, 4]) {
					cube(size = [1, 1, 1]);
				}
			}
			/*Node $_43__3*/
			color(alpha = 0.1, c = "lightblue") {
				translate(v = [4, 0, 4]) {
					cube(size = [1, 1, 1]);
				}
			}
			/*Node $_32__3*/
			color(alpha = 0.1, c = "lightblue") {
				translate(v = [-3, -4, 4]) {
					cube(size = [1, 1, 1]);
				}
			}
			/*Node $_9__3*/
			color(alpha = 0.1, c = "lightblue") {
				translate(v = [-4, 4, -4]) {
					cube(size = [1, 1, 1]);
				}
			}
			/*Node $_22__3*/
			color(alpha = 0.1, c = "lightblue") {
				translate(v = [4, -2, 4]) {
					cube(size = [1, 1, 1]);
				}
			}
			/*Node $_31__3*/
			color(alpha = 0.1, c = "lightblue") {
				translate(v = [4, 3, -4]) {
					cube(size = [1, 1, 1]);
				}
			}
			/*Node $_16__3*/
			color(alpha = 0.1, c = "lightblue") {
				translate(v = [2, -4, 0]) {
					cube(size = [1, 1, 1]);
				}
			}
			/*Node $_13__3*/
			color(alpha = 0.1, c = "lightblue") {
				translate(v = [4, -4, 4]) {
					cube(size = [1, 1, 1]);
				}
			}
		}
		/*Edges shell 3*/
		union();
	}
	/*Shell 4*/
	union() {
		%/*Nodes shell 4*/
		union();
		/*Edges shell 4*/
		union();
	}
	/*Shell 5*/
	union() {
		%/*Nodes shell 5*/
		union() {
			/*Node one.ctrl_a[5].flush*/
			color(alpha = 0.1, c = "lightgreen") {
				translate(v = [-3, -6, 0]) {
					cube(size = [1, 1, 1]);
				}
			}
			/*Node one.ctrl_a[5].hole*/
			color(alpha = 0.1, c = "green") {
				translate(v = [-3, -6, 2]) {
					cube(size = [1, 1, 1]);
				}
			}
			/*Node one.ctrl_a[6].flush*/
			color(alpha = 0.1, c = "lightgreen") {
				translate(v = [-4, -6, 0]) {
					cube(size = [1, 1, 1]);
				}
			}
			/*Node one.ctrl_a[6].hole*/
			color(alpha = 0.1, c = "green") {
				translate(v = [-6, -5, 0]) {
					cube(size = [1, 1, 1]);
				}
			}
			/*Node one.ctrl_s[2].flush*/
			color(alpha = 0.1, c = "lightgreen") {
				translate(v = [-6, -2, 2]) {
					cube(size = [1, 1, 1]);
				}
			}
			/*Node one.ctrl_s[2].hole*/
			color(alpha = 0.1, c = "green") {
				translate(v = [-6, -2, 4]) {
					cube(size = [1, 1, 1]);
				}
			}
			/*Node one.ctrl_s[3].flush*/
			color(alpha = 0.1, c = "lightgreen") {
				translate(v = [-4, -6, 6]) {
					cube(size = [1, 1, 1]);
				}
			}
			/*Node one.ctrl_s[3].hole*/
			color(alpha = 0.1, c = "green") {
				translate(v = [-6, -4, 5]) {
					cube(size = [1, 1, 1]);
				}
			}
			/*Node one.pump_a[2].flush*/
			color(alpha = 0.1, c = "lightgreen") {
				translate(v = [-6, -3, 2]) {
					cube(size = [1, 1, 1]);
				}
			}
			/*Node one.pump_a[2].hole*/
			color(alpha = 0.1, c = "green") {
				translate(v = [-6, -3, 1]) {
					cube(size = [1, 1, 1]);
				}
			}
			/*Node one.thingy.devices[0].thingy.circulate2*/
			color(alpha = 0.1, c = "black") {
				translate(v = [-5, -6, 0]) {
					cube(size = [1, 1, 1]);
				}
			}
			/*Node one.thingy.devices[0].thingy.vp1*/
			color(alpha = 0.1, c = "black") {
				translate(v = [-6, -5, 2]) {
					cube(size = [1, 1, 1]);
				}
			}
			/*Node one.thingy.devices[0].thingy.vp4*/
			color(alpha = 0.1, c = "black") {
				translate(v = [-6, -4, 2]) {
					cube(size = [1, 1, 1]);
				}
			}
			/*Node one.thingy.devices[0].thingy.vs1*/
			color(alpha = 0.1, c = "black") {
				translate(v = [-6, -6, 0]) {
					cube(size = [1, 1, 1]);
				}
			}
			/*Node $_18__5*/
			color(alpha = 0.1, c = "lightblue") {
				translate(v = [-6, -4, 6]) {
					cube(size = [1, 1, 1]);
				}
			}
			/*Node $_19__5*/
			color(alpha = 0.1, c = "lightblue") {
				translate(v = [-6, -2, 3]) {
					cube(size = [1, 1, 1]);
				}
			}
			/*Node $_33__5*/
			color(alpha = 0.1, c = "lightblue") {
				translate(v = [-1, -6, 6]) {
					cube(size = [1, 1, 1]);
				}
			}
			/*Node $_12__5*/
			color(alpha = 0.1, c = "lightblue") {
				translate(v = [-6, 0, 6]) {
					cube(size = [1, 1, 1]);
				}
			}
			/*Node $_39__5*/
			color(alpha = 0.1, c = "lightblue") {
				translate(v = [-6, 1, 6]) {
					cube(size = [1, 1, 1]);
				}
			}
			/*Node $_40__5*/
			color(alpha = 0.1, c = "lightblue") {
				translate(v = [-2, -4, 6]) {
					cube(size = [1, 1, 1]);
				}
			}
			/*Node $_35__5*/
			color(alpha = 0.1, c = "lightblue") {
				translate(v = [-6, -5, 1]) {
					cube(size = [1, 1, 1]);
				}
			}
			/*Node $_20__5*/
			color(alpha = 0.1, c = "lightblue") {
				translate(v = [0, -1, 6]) {
					cube(size = [1, 1, 1]);
				}
			}
			/*Node $_34__5*/
			color(alpha = 0.1, c = "lightblue") {
				translate(v = [-1, 0, 6]) {
					cube(size = [1, 1, 1]);
				}
			}
			/*Node $_108__5*/
			color(alpha = 0.1, c = "lightblue") {
				translate(v = [-4, -4, 6]) {
					cube(size = [1, 1, 1]);
				}
			}
			/*Node $_44__5*/
			color(alpha = 0.1, c = "lightblue") {
				translate(v = [-6, -6, 4]) {
					cube(size = [1, 1, 1]);
				}
			}
			/*Node $_11__5*/
			color(alpha = 0.1, c = "lightblue") {
				translate(v = [0, 0, 6]) {
					cube(size = [1, 1, 1]);
				}
			}
			/*Node $_41__5*/
			color(alpha = 0.1, c = "lightblue") {
				translate(v = [-6, -4, 3]) {
					cube(size = [1, 1, 1]);
				}
			}
			/*Node $_42__5*/
			color(alpha = 0.1, c = "lightblue") {
				translate(v = [-6, -1, 6]) {
					cube(size = [1, 1, 1]);
				}
			}
			/*Node $_10__5*/
			color(alpha = 0.1, c = "lightblue") {
				translate(v = [0, -6, 6]) {
					cube(size = [1, 1, 1]);
				}
			}
			/*Node $_17__5*/
			color(alpha = 0.1, c = "lightblue") {
				translate(v = [-6, -2, 5]) {
					cube(size = [1, 1, 1]);
				}
			}
			/*Node $_21__5*/
			color(alpha = 0.1, c = "lightblue") {
				translate(v = [-6, -6, 6]) {
					cube(size = [1, 1, 1]);
				}
			}
			/*Node $_38__5*/
			color(alpha = 0.1, c = "lightblue") {
				translate(v = [-6, -2, 6]) {
					cube(size = [1, 1, 1]);
				}
			}
			/*Node $_43__5*/
			color(alpha = 0.1, c = "lightblue") {
				translate(v = [-6, -6, 5]) {
					cube(size = [1, 1, 1]);
				}
			}
			/*Node $_32__5*/
			color(alpha = 0.1, c = "lightblue") {
				translate(v = [0, -6, 3]) {
					cube(size = [1, 1, 1]);
				}
			}
			/*Node $_9__5*/
			color(alpha = 0.1, c = "lightblue") {
				translate(v = [-6, -6, 3]) {
					cube(size = [1, 1, 1]);
				}
			}
			/*Node $_22__5*/
			color(alpha = 0.1, c = "lightblue") {
				translate(v = [-3, -6, 6]) {
					cube(size = [1, 1, 1]);
				}
			}
			/*Node $_31__5*/
			color(alpha = 0.1, c = "lightblue") {
				translate(v = [-3, 0, 6]) {
					cube(size = [1, 1, 1]);
				}
			}
			/*Node $_16__5*/
			color(alpha = 0.1, c = "lightblue") {
				translate(v = [-2, 0, 6]) {
					cube(size = [1, 1, 1]);
				}
			}
			/*Node $_13__5*/
			color(alpha = 0.1, c = "lightblue") {
				translate(v = [-6, -5, 4]) {
					cube(size = [1, 1, 1]);
				}
			}
		}
		/*Edges shell 5*/
		union();
	}
	/*Shell 6*/
	union() {
		%/*Nodes shell 6*/
		union();
		/*Edges shell 6*/
		union();
	}
	/*Shell 7*/
	union() {
		%/*Nodes shell 7*/
		union();
		/*Edges shell 7*/
		union();
	}
	/*Shell 8*/
	union() {
		%/*Nodes shell 8*/
		union();
		/*Edges shell 8*/
		union();
	}
	/*Shell 9*/
	union() {
		%/*Nodes shell 9*/
		union();
		/*Edges shell 9*/
		union();
	}
	/*Shell 10*/
	union() {
		%/*Nodes shell 10*/
		union();
		/*Edges shell 10*/
		union();
	}
	/*Shell 11*/
	union() {
		%/*Nodes shell 11*/
		union();
		/*Edges shell 11*/
		union();
	}
	/*Shell 12*/
	union() {
		%/*Nodes shell 12*/
		union();
		/*Edges shell 12*/
		union();
	}
	/*Shell 13*/
	union() {
		%/*Nodes shell 13*/
		union();
		/*Edges shell 13*/
		union();
	}
	/*Shell 14*/
	union() {
		%/*Nodes shell 14*/
		union();
		/*Edges shell 14*/
		union();
	}
}
